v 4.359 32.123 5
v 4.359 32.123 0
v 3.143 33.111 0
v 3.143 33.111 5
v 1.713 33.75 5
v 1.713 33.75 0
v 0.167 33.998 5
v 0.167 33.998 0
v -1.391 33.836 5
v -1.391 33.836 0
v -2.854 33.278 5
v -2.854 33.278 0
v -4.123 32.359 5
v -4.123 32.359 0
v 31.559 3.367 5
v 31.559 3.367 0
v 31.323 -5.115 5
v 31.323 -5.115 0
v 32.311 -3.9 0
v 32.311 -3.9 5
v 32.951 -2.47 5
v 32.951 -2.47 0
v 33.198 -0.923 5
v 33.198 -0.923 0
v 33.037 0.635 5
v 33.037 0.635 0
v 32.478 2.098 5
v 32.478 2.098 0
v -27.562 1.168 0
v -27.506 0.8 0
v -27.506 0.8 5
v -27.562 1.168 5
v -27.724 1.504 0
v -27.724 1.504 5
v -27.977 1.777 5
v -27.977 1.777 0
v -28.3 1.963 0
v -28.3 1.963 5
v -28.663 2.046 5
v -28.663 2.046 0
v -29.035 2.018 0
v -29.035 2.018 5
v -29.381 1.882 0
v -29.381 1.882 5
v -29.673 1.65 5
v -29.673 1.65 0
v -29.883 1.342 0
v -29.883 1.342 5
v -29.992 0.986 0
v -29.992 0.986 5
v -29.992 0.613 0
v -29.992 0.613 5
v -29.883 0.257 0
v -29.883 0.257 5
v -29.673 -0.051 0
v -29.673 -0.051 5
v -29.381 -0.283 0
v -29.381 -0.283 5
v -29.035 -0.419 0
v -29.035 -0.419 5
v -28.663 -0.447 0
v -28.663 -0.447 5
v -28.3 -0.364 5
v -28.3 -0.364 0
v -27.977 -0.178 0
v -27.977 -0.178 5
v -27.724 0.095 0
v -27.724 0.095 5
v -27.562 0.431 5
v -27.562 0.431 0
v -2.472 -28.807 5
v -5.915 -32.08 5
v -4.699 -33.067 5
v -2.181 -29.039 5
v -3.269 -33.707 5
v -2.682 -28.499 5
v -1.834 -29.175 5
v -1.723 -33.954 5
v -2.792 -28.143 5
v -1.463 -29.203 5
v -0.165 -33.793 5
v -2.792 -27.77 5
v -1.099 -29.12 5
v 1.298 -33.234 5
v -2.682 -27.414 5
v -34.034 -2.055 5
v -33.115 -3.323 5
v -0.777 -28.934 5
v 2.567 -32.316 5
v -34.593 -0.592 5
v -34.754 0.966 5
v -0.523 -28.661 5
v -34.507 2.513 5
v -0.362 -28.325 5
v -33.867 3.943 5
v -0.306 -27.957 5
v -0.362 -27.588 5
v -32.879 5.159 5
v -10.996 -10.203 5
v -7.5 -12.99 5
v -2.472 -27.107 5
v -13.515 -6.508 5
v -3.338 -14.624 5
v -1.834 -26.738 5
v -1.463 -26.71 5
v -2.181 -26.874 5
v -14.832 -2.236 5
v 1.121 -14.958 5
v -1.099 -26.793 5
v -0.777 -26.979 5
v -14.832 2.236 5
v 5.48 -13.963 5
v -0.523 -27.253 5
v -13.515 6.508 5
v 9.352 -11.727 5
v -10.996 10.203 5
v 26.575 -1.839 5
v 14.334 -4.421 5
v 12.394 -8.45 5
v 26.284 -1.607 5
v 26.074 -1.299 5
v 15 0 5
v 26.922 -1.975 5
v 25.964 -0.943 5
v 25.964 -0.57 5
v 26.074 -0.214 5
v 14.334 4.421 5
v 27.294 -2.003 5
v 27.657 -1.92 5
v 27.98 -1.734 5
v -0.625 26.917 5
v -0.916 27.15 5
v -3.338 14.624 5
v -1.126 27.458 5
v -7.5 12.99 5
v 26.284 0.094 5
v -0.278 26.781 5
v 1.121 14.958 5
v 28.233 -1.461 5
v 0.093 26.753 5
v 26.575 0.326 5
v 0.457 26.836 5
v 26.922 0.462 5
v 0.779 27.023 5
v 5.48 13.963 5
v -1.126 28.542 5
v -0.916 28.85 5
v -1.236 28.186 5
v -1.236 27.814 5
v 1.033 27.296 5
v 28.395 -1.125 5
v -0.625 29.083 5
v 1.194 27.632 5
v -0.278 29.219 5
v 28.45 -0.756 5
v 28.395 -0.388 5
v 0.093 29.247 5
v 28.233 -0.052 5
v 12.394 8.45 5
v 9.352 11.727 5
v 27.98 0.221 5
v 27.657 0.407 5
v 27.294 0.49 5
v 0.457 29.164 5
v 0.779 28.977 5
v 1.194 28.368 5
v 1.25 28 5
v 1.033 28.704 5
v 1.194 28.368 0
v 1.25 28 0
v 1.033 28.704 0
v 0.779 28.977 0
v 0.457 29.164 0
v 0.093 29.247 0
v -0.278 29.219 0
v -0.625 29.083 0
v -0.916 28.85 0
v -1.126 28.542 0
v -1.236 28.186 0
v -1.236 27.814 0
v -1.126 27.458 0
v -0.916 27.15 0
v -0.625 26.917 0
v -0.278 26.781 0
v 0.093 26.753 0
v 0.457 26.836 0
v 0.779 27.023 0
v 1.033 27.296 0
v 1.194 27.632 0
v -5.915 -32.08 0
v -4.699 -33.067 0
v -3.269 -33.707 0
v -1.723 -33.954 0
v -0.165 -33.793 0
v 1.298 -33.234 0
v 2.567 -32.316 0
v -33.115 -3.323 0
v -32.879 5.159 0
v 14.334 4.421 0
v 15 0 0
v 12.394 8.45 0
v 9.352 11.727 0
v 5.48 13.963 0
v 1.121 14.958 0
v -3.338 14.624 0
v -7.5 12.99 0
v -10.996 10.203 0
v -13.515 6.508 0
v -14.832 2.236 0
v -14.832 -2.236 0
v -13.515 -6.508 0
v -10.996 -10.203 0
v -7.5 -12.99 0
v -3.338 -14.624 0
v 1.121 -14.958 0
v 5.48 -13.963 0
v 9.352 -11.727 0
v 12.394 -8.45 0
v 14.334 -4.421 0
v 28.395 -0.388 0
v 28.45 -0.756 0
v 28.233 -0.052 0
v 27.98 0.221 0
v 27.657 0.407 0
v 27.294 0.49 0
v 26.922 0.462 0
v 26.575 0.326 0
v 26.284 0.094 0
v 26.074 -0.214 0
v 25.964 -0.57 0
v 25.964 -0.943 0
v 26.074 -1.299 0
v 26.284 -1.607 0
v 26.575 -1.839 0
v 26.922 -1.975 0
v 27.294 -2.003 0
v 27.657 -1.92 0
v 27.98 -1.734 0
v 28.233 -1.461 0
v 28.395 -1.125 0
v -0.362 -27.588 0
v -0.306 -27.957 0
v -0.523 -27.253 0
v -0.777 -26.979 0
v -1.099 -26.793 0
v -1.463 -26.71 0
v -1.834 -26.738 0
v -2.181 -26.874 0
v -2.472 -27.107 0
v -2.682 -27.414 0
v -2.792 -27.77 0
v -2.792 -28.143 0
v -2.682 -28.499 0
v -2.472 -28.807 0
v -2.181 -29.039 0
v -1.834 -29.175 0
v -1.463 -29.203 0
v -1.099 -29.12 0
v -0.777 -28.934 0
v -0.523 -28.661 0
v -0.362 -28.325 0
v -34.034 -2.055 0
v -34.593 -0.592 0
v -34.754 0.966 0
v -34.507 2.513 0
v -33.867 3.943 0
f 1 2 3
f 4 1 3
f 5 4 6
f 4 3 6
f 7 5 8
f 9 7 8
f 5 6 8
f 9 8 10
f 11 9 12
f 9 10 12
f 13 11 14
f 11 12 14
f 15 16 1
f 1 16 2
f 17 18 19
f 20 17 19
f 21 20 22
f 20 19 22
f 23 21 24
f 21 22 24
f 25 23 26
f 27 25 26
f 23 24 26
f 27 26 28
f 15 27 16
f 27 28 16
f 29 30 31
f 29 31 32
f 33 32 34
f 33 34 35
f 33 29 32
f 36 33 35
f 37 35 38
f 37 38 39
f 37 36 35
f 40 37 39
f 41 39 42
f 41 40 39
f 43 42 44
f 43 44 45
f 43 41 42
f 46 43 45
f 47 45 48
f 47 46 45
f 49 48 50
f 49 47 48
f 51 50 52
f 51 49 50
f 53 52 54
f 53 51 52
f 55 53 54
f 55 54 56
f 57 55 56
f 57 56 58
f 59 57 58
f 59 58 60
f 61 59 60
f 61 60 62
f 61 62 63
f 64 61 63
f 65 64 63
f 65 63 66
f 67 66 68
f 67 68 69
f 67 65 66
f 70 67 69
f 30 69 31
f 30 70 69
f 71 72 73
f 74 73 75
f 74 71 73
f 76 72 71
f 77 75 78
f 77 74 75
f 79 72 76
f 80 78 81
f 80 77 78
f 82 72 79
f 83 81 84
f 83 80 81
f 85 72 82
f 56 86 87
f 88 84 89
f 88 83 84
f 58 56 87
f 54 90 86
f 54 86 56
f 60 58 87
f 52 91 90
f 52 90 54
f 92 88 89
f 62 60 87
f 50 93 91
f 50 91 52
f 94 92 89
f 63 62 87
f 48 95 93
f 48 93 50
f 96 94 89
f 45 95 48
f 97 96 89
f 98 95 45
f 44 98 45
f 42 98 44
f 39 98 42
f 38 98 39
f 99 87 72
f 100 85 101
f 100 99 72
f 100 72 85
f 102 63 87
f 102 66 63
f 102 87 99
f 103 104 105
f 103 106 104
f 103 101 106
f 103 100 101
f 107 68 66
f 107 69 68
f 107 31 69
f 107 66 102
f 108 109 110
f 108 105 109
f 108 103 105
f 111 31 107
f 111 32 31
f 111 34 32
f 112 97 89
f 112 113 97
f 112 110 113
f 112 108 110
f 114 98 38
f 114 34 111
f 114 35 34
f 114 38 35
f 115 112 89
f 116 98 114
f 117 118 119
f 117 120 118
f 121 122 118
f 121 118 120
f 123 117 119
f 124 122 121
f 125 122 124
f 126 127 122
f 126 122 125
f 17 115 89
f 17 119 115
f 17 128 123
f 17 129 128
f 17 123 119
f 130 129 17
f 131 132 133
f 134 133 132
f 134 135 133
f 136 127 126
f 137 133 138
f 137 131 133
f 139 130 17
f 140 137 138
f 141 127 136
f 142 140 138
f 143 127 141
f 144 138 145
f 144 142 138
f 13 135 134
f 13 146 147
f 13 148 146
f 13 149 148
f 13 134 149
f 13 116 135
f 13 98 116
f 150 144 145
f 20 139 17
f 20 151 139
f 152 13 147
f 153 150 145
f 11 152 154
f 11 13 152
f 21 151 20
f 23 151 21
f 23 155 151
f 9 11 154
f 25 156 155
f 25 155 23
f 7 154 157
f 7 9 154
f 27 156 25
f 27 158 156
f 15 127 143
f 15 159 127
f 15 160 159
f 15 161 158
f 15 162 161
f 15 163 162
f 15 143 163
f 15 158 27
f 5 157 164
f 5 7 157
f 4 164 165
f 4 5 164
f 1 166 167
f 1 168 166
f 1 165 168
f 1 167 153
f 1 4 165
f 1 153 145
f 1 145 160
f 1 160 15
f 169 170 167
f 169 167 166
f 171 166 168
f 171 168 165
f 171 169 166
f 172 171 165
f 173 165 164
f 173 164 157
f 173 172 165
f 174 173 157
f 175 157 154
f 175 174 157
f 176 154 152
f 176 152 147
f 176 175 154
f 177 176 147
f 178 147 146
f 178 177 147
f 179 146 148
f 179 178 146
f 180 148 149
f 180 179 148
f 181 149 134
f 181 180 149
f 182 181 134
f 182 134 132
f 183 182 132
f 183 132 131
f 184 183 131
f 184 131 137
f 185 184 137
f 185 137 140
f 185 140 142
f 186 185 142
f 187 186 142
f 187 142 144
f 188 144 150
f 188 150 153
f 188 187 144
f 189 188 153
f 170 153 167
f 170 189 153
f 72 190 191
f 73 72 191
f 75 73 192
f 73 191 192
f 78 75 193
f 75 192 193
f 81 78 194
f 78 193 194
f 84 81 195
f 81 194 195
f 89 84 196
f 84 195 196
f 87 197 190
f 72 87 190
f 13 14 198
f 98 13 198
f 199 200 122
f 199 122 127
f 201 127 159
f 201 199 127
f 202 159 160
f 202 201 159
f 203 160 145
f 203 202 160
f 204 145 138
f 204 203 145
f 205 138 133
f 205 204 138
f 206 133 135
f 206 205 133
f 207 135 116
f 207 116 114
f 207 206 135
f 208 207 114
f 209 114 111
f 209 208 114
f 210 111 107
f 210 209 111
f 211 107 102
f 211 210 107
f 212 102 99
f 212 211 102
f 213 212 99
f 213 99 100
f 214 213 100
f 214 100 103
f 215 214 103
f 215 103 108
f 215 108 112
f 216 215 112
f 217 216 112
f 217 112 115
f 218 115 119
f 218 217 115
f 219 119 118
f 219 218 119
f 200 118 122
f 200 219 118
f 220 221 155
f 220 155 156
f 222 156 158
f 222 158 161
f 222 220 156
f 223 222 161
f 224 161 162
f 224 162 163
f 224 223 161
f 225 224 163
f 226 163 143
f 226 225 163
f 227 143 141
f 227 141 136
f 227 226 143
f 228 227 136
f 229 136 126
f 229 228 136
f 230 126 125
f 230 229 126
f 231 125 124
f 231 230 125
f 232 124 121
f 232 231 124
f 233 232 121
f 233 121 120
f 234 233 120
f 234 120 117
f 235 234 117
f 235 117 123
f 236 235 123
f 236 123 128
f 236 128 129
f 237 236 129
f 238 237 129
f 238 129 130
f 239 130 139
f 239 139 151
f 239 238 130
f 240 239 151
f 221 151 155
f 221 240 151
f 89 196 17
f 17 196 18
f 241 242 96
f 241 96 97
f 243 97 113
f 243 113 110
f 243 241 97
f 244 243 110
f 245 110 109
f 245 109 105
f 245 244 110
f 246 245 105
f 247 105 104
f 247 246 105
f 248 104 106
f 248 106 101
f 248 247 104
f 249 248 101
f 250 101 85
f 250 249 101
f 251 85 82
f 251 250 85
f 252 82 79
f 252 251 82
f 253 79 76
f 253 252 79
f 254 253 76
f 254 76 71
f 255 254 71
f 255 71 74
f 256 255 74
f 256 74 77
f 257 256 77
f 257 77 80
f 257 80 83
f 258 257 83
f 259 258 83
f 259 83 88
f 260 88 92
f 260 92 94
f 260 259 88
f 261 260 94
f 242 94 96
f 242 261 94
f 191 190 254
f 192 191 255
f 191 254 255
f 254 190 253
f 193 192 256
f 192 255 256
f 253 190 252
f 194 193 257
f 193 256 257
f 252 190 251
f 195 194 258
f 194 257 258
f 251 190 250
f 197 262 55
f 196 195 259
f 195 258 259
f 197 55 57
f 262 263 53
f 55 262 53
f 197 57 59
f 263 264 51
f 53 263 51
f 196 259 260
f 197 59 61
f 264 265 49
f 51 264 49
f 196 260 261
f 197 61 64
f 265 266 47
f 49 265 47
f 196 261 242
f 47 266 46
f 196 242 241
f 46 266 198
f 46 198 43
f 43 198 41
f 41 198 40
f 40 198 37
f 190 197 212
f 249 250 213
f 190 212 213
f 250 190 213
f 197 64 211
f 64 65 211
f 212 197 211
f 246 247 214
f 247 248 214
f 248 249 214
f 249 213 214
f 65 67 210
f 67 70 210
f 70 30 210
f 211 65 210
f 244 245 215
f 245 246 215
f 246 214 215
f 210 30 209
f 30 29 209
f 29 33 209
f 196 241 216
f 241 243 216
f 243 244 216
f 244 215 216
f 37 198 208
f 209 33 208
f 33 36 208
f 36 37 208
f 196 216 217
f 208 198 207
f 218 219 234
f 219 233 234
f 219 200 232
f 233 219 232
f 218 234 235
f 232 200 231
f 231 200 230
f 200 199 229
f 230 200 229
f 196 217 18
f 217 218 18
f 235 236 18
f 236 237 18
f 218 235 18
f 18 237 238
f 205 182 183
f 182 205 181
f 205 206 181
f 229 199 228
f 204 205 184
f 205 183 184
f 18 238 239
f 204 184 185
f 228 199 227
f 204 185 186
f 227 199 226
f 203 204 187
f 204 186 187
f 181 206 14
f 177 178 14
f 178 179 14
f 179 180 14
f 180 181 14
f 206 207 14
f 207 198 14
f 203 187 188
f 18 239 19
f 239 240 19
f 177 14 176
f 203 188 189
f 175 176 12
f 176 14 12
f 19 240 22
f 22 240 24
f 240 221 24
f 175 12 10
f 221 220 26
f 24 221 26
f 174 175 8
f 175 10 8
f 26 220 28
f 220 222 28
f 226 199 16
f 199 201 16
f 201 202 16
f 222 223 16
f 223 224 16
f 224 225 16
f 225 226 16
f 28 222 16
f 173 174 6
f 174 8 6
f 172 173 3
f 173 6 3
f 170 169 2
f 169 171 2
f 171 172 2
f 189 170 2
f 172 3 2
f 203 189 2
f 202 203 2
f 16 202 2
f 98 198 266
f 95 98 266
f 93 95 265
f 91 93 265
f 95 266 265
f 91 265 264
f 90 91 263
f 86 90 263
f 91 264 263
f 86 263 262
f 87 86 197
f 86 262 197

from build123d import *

# Parameters (mm, degrees)
SKETCH1_R           = 15
SKETCH1_R_2         = 1.25
BOSS_EXTRUDE1_DEPTH = 5


with BuildPart() as part:
    # Sketch1 → Boss-Extrude1 (new body)
    with BuildSketch(Plane.XY):
        with BuildLine():
            Line((-33.115304549, -3.323429394), (-5.914945157, -32.079801303))
            ThreePointArc((-5.914945157, -32.079801303), (-1.722792588, -33.954412887), (2.567057485, -32.315663941))
            Line((2.567057485, -32.315663941), (31.323429394, -5.115304549))
            ThreePointArc((31.323429394, -5.115304549), (33.198040978, -0.92315198), (31.559292032, 3.366698093))
            Line((31.559292032, 3.366698093), (4.35893264, 32.123070002))
            ThreePointArc((4.35893264, 32.123070002), (0.166780071, 33.997681586), (-4.123070002, 32.35893264))
            Line((-4.123070002, 32.35893264), (-32.879441911, 5.158573248))
            ThreePointArc((-32.879441911, 5.158573248), (-34.754053495, 0.966420679), (-33.115304549, -3.323429394))
        make_face()
        Circle(SKETCH1_R, mode=Mode.SUBTRACT)
        with Locations((0, 28)):
            Circle(SKETCH1_R_2, mode=Mode.SUBTRACT)
        with Locations((27.200359392, -0.756371909)):
            Circle(SKETCH1_R_2, mode=Mode.SUBTRACT)
        with Locations((-1.556012517, -27.956731301)):
            Circle(SKETCH1_R_2, mode=Mode.SUBTRACT)
        with Locations((-28.756371909, 0.799640608)):
            Circle(SKETCH1_R_2, mode=Mode.SUBTRACT)
    extrude(amount=BOSS_EXTRUDE1_DEPTH)


solid = part.part
